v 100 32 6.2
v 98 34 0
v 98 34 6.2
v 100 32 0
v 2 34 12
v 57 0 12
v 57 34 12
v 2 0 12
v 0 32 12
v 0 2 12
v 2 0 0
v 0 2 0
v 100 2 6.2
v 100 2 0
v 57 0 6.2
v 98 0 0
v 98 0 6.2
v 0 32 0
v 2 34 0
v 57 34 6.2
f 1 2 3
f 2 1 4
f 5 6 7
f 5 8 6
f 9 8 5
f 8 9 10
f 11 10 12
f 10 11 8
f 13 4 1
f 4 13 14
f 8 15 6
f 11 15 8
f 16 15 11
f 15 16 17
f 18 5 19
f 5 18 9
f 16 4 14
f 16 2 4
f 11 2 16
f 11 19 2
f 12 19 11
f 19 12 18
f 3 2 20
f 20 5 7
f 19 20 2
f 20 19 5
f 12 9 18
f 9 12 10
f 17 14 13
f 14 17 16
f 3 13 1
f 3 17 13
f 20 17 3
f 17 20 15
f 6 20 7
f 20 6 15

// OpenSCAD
$fn = 32;

// ----------------------------------------------------------------------
// Stepped bar: endstep, 100 x 34 x 12/6.2 mm
// ----------------------------------------------------------------------

// --- parameters (mm) ---
bar_l = 100;              // bar length, X
bar_w = 34;               // bar width, Y
plate_t = 12;             // thickness of the thick zone, Z
thin_t = 6.2;             // thickness of the thin zone
corner_c = 2;             // corner chamfer of the bar
step_cut = 5.8;           // material removed from the thin zone
step_x = 57;              // step position from the left end
depth_1 = 5.8;            // depth of cut 1 from the top face

profile = [[2, 0], [98, 0], [100, 2], [100, 32], [98, 34], [2, 34], [0, 32], [0, 2]];  // primary outline, 8 points, counter clockwise
void_1 = [[57, -1], [101, -1], [101, 35], [57, 35]];  // thin zone beyond the step, 4 points

// --- the one profile operation ---
difference() {
  linear_extrude(height = plate_t) polygon(points = profile);
  translate([0, 0, plate_t - depth_1])
    linear_extrude(height = depth_1 + 1) polygon(points = void_1);
}
